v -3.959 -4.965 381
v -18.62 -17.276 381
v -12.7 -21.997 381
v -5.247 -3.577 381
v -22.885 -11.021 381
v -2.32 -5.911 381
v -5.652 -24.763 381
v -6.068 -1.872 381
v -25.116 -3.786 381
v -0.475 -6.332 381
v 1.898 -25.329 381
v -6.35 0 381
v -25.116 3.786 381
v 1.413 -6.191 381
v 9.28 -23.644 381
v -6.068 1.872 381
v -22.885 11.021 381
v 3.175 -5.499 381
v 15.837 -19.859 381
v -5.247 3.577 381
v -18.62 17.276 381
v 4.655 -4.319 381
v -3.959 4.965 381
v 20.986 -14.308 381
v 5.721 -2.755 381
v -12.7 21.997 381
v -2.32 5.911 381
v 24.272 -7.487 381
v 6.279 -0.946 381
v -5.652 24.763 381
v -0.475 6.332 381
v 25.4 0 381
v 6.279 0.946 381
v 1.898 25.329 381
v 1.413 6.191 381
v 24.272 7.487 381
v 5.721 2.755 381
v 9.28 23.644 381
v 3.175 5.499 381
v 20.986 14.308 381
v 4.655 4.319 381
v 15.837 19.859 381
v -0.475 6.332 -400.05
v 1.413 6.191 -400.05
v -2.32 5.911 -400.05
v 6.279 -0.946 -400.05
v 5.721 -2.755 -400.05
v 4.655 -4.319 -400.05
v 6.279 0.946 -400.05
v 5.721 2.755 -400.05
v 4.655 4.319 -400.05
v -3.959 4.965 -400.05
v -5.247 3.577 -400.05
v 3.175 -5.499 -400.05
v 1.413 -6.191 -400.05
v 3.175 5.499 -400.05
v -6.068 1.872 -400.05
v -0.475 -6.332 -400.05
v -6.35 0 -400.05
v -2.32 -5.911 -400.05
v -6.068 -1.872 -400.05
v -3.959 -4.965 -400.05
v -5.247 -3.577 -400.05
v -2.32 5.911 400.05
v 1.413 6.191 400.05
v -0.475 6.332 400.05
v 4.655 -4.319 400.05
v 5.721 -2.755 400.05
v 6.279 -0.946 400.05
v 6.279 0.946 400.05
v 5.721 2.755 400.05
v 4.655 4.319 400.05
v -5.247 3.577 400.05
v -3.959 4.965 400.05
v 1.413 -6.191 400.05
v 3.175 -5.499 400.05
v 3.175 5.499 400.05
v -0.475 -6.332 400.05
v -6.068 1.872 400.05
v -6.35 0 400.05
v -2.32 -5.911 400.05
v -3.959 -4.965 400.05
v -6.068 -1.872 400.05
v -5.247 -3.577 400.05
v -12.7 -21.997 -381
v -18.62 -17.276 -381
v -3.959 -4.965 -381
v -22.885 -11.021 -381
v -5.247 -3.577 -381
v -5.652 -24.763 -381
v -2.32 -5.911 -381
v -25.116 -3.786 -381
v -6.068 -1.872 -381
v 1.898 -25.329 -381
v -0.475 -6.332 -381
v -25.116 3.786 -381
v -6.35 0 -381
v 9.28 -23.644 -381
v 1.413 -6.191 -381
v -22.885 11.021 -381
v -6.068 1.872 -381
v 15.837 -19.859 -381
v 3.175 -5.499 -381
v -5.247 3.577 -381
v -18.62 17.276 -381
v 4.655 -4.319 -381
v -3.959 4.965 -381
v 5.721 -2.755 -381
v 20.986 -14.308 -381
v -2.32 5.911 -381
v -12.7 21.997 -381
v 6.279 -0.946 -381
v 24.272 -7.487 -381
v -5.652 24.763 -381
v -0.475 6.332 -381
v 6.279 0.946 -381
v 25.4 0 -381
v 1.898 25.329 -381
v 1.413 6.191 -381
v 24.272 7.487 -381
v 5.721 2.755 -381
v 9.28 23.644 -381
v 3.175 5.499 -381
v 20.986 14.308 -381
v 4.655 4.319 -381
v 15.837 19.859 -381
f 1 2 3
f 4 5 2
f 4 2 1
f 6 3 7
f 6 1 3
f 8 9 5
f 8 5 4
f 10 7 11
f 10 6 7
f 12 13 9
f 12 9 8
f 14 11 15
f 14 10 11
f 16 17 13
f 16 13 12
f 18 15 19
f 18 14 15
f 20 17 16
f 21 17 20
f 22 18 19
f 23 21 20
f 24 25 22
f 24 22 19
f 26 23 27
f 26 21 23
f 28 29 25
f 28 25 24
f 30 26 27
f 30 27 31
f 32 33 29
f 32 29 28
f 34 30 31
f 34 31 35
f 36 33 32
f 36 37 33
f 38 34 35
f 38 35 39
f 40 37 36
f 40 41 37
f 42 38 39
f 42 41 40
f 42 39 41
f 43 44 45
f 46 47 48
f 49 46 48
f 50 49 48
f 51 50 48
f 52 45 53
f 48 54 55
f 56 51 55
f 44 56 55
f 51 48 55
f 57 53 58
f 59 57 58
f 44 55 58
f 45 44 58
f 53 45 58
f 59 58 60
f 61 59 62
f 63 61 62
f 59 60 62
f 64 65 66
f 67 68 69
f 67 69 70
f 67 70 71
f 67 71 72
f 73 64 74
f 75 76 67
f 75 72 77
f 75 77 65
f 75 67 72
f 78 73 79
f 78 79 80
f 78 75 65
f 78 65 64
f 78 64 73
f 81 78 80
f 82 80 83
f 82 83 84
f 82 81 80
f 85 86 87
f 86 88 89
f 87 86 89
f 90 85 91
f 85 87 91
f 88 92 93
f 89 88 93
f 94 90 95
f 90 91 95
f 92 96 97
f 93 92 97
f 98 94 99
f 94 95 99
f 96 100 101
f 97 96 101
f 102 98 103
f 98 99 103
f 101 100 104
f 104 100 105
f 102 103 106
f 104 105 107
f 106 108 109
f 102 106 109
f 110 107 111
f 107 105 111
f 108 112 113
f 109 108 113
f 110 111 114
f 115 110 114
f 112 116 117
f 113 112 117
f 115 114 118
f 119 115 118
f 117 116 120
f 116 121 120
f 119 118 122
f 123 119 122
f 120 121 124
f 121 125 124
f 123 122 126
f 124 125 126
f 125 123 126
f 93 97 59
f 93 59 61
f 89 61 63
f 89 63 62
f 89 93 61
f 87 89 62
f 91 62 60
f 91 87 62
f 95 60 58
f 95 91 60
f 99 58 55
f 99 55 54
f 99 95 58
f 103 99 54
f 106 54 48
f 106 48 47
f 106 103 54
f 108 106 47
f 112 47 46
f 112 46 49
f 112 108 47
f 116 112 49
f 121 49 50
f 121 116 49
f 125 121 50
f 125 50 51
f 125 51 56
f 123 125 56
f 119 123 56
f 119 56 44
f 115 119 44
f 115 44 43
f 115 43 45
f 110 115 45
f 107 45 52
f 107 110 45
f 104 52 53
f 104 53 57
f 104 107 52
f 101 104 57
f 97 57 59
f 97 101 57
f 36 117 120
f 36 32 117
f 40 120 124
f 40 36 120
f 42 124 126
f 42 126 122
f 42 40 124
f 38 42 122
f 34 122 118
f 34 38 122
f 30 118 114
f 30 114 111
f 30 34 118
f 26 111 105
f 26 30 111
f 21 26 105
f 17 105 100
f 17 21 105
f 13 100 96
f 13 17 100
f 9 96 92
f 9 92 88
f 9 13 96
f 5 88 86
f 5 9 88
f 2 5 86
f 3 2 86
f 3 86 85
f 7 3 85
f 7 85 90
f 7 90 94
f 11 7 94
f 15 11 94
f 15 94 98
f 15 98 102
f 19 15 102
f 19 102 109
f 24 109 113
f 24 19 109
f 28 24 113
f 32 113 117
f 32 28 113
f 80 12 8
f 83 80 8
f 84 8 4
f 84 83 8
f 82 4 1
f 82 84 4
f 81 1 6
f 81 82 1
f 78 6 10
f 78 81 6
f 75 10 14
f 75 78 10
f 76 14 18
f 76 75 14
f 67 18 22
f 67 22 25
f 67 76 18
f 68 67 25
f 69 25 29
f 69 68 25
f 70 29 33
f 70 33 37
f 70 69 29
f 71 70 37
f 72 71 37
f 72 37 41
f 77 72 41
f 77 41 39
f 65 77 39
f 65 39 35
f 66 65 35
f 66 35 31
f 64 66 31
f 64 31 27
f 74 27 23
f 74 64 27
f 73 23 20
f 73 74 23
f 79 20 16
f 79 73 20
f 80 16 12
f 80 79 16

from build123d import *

# Parameters (mm, degrees)
SKETCH1_R           = 6.35
BOSS_EXTRUDE1_DEPTH = 400.05
SKETCH1_3_R         = 25.4
SKETCH1_3_R_2       = 6.35
BOSS_EXTRUDE2_DEPTH = 381


with BuildPart() as part:
    # Sketch1 → Boss-Extrude1 (new, symmetric)
    with BuildSketch(Plane.XY):
        Circle(SKETCH1_R)
    extrude(amount=BOSS_EXTRUDE1_DEPTH, both=True)

    # Sketch1<3> → Boss-Extrude2 (add, symmetric)
    with BuildSketch(Plane.XY):
        Circle(SKETCH1_3_R)
        Circle(SKETCH1_3_R_2, mode=Mode.SUBTRACT)
    extrude(amount=BOSS_EXTRUDE2_DEPTH, both=True)


solid = part.part
